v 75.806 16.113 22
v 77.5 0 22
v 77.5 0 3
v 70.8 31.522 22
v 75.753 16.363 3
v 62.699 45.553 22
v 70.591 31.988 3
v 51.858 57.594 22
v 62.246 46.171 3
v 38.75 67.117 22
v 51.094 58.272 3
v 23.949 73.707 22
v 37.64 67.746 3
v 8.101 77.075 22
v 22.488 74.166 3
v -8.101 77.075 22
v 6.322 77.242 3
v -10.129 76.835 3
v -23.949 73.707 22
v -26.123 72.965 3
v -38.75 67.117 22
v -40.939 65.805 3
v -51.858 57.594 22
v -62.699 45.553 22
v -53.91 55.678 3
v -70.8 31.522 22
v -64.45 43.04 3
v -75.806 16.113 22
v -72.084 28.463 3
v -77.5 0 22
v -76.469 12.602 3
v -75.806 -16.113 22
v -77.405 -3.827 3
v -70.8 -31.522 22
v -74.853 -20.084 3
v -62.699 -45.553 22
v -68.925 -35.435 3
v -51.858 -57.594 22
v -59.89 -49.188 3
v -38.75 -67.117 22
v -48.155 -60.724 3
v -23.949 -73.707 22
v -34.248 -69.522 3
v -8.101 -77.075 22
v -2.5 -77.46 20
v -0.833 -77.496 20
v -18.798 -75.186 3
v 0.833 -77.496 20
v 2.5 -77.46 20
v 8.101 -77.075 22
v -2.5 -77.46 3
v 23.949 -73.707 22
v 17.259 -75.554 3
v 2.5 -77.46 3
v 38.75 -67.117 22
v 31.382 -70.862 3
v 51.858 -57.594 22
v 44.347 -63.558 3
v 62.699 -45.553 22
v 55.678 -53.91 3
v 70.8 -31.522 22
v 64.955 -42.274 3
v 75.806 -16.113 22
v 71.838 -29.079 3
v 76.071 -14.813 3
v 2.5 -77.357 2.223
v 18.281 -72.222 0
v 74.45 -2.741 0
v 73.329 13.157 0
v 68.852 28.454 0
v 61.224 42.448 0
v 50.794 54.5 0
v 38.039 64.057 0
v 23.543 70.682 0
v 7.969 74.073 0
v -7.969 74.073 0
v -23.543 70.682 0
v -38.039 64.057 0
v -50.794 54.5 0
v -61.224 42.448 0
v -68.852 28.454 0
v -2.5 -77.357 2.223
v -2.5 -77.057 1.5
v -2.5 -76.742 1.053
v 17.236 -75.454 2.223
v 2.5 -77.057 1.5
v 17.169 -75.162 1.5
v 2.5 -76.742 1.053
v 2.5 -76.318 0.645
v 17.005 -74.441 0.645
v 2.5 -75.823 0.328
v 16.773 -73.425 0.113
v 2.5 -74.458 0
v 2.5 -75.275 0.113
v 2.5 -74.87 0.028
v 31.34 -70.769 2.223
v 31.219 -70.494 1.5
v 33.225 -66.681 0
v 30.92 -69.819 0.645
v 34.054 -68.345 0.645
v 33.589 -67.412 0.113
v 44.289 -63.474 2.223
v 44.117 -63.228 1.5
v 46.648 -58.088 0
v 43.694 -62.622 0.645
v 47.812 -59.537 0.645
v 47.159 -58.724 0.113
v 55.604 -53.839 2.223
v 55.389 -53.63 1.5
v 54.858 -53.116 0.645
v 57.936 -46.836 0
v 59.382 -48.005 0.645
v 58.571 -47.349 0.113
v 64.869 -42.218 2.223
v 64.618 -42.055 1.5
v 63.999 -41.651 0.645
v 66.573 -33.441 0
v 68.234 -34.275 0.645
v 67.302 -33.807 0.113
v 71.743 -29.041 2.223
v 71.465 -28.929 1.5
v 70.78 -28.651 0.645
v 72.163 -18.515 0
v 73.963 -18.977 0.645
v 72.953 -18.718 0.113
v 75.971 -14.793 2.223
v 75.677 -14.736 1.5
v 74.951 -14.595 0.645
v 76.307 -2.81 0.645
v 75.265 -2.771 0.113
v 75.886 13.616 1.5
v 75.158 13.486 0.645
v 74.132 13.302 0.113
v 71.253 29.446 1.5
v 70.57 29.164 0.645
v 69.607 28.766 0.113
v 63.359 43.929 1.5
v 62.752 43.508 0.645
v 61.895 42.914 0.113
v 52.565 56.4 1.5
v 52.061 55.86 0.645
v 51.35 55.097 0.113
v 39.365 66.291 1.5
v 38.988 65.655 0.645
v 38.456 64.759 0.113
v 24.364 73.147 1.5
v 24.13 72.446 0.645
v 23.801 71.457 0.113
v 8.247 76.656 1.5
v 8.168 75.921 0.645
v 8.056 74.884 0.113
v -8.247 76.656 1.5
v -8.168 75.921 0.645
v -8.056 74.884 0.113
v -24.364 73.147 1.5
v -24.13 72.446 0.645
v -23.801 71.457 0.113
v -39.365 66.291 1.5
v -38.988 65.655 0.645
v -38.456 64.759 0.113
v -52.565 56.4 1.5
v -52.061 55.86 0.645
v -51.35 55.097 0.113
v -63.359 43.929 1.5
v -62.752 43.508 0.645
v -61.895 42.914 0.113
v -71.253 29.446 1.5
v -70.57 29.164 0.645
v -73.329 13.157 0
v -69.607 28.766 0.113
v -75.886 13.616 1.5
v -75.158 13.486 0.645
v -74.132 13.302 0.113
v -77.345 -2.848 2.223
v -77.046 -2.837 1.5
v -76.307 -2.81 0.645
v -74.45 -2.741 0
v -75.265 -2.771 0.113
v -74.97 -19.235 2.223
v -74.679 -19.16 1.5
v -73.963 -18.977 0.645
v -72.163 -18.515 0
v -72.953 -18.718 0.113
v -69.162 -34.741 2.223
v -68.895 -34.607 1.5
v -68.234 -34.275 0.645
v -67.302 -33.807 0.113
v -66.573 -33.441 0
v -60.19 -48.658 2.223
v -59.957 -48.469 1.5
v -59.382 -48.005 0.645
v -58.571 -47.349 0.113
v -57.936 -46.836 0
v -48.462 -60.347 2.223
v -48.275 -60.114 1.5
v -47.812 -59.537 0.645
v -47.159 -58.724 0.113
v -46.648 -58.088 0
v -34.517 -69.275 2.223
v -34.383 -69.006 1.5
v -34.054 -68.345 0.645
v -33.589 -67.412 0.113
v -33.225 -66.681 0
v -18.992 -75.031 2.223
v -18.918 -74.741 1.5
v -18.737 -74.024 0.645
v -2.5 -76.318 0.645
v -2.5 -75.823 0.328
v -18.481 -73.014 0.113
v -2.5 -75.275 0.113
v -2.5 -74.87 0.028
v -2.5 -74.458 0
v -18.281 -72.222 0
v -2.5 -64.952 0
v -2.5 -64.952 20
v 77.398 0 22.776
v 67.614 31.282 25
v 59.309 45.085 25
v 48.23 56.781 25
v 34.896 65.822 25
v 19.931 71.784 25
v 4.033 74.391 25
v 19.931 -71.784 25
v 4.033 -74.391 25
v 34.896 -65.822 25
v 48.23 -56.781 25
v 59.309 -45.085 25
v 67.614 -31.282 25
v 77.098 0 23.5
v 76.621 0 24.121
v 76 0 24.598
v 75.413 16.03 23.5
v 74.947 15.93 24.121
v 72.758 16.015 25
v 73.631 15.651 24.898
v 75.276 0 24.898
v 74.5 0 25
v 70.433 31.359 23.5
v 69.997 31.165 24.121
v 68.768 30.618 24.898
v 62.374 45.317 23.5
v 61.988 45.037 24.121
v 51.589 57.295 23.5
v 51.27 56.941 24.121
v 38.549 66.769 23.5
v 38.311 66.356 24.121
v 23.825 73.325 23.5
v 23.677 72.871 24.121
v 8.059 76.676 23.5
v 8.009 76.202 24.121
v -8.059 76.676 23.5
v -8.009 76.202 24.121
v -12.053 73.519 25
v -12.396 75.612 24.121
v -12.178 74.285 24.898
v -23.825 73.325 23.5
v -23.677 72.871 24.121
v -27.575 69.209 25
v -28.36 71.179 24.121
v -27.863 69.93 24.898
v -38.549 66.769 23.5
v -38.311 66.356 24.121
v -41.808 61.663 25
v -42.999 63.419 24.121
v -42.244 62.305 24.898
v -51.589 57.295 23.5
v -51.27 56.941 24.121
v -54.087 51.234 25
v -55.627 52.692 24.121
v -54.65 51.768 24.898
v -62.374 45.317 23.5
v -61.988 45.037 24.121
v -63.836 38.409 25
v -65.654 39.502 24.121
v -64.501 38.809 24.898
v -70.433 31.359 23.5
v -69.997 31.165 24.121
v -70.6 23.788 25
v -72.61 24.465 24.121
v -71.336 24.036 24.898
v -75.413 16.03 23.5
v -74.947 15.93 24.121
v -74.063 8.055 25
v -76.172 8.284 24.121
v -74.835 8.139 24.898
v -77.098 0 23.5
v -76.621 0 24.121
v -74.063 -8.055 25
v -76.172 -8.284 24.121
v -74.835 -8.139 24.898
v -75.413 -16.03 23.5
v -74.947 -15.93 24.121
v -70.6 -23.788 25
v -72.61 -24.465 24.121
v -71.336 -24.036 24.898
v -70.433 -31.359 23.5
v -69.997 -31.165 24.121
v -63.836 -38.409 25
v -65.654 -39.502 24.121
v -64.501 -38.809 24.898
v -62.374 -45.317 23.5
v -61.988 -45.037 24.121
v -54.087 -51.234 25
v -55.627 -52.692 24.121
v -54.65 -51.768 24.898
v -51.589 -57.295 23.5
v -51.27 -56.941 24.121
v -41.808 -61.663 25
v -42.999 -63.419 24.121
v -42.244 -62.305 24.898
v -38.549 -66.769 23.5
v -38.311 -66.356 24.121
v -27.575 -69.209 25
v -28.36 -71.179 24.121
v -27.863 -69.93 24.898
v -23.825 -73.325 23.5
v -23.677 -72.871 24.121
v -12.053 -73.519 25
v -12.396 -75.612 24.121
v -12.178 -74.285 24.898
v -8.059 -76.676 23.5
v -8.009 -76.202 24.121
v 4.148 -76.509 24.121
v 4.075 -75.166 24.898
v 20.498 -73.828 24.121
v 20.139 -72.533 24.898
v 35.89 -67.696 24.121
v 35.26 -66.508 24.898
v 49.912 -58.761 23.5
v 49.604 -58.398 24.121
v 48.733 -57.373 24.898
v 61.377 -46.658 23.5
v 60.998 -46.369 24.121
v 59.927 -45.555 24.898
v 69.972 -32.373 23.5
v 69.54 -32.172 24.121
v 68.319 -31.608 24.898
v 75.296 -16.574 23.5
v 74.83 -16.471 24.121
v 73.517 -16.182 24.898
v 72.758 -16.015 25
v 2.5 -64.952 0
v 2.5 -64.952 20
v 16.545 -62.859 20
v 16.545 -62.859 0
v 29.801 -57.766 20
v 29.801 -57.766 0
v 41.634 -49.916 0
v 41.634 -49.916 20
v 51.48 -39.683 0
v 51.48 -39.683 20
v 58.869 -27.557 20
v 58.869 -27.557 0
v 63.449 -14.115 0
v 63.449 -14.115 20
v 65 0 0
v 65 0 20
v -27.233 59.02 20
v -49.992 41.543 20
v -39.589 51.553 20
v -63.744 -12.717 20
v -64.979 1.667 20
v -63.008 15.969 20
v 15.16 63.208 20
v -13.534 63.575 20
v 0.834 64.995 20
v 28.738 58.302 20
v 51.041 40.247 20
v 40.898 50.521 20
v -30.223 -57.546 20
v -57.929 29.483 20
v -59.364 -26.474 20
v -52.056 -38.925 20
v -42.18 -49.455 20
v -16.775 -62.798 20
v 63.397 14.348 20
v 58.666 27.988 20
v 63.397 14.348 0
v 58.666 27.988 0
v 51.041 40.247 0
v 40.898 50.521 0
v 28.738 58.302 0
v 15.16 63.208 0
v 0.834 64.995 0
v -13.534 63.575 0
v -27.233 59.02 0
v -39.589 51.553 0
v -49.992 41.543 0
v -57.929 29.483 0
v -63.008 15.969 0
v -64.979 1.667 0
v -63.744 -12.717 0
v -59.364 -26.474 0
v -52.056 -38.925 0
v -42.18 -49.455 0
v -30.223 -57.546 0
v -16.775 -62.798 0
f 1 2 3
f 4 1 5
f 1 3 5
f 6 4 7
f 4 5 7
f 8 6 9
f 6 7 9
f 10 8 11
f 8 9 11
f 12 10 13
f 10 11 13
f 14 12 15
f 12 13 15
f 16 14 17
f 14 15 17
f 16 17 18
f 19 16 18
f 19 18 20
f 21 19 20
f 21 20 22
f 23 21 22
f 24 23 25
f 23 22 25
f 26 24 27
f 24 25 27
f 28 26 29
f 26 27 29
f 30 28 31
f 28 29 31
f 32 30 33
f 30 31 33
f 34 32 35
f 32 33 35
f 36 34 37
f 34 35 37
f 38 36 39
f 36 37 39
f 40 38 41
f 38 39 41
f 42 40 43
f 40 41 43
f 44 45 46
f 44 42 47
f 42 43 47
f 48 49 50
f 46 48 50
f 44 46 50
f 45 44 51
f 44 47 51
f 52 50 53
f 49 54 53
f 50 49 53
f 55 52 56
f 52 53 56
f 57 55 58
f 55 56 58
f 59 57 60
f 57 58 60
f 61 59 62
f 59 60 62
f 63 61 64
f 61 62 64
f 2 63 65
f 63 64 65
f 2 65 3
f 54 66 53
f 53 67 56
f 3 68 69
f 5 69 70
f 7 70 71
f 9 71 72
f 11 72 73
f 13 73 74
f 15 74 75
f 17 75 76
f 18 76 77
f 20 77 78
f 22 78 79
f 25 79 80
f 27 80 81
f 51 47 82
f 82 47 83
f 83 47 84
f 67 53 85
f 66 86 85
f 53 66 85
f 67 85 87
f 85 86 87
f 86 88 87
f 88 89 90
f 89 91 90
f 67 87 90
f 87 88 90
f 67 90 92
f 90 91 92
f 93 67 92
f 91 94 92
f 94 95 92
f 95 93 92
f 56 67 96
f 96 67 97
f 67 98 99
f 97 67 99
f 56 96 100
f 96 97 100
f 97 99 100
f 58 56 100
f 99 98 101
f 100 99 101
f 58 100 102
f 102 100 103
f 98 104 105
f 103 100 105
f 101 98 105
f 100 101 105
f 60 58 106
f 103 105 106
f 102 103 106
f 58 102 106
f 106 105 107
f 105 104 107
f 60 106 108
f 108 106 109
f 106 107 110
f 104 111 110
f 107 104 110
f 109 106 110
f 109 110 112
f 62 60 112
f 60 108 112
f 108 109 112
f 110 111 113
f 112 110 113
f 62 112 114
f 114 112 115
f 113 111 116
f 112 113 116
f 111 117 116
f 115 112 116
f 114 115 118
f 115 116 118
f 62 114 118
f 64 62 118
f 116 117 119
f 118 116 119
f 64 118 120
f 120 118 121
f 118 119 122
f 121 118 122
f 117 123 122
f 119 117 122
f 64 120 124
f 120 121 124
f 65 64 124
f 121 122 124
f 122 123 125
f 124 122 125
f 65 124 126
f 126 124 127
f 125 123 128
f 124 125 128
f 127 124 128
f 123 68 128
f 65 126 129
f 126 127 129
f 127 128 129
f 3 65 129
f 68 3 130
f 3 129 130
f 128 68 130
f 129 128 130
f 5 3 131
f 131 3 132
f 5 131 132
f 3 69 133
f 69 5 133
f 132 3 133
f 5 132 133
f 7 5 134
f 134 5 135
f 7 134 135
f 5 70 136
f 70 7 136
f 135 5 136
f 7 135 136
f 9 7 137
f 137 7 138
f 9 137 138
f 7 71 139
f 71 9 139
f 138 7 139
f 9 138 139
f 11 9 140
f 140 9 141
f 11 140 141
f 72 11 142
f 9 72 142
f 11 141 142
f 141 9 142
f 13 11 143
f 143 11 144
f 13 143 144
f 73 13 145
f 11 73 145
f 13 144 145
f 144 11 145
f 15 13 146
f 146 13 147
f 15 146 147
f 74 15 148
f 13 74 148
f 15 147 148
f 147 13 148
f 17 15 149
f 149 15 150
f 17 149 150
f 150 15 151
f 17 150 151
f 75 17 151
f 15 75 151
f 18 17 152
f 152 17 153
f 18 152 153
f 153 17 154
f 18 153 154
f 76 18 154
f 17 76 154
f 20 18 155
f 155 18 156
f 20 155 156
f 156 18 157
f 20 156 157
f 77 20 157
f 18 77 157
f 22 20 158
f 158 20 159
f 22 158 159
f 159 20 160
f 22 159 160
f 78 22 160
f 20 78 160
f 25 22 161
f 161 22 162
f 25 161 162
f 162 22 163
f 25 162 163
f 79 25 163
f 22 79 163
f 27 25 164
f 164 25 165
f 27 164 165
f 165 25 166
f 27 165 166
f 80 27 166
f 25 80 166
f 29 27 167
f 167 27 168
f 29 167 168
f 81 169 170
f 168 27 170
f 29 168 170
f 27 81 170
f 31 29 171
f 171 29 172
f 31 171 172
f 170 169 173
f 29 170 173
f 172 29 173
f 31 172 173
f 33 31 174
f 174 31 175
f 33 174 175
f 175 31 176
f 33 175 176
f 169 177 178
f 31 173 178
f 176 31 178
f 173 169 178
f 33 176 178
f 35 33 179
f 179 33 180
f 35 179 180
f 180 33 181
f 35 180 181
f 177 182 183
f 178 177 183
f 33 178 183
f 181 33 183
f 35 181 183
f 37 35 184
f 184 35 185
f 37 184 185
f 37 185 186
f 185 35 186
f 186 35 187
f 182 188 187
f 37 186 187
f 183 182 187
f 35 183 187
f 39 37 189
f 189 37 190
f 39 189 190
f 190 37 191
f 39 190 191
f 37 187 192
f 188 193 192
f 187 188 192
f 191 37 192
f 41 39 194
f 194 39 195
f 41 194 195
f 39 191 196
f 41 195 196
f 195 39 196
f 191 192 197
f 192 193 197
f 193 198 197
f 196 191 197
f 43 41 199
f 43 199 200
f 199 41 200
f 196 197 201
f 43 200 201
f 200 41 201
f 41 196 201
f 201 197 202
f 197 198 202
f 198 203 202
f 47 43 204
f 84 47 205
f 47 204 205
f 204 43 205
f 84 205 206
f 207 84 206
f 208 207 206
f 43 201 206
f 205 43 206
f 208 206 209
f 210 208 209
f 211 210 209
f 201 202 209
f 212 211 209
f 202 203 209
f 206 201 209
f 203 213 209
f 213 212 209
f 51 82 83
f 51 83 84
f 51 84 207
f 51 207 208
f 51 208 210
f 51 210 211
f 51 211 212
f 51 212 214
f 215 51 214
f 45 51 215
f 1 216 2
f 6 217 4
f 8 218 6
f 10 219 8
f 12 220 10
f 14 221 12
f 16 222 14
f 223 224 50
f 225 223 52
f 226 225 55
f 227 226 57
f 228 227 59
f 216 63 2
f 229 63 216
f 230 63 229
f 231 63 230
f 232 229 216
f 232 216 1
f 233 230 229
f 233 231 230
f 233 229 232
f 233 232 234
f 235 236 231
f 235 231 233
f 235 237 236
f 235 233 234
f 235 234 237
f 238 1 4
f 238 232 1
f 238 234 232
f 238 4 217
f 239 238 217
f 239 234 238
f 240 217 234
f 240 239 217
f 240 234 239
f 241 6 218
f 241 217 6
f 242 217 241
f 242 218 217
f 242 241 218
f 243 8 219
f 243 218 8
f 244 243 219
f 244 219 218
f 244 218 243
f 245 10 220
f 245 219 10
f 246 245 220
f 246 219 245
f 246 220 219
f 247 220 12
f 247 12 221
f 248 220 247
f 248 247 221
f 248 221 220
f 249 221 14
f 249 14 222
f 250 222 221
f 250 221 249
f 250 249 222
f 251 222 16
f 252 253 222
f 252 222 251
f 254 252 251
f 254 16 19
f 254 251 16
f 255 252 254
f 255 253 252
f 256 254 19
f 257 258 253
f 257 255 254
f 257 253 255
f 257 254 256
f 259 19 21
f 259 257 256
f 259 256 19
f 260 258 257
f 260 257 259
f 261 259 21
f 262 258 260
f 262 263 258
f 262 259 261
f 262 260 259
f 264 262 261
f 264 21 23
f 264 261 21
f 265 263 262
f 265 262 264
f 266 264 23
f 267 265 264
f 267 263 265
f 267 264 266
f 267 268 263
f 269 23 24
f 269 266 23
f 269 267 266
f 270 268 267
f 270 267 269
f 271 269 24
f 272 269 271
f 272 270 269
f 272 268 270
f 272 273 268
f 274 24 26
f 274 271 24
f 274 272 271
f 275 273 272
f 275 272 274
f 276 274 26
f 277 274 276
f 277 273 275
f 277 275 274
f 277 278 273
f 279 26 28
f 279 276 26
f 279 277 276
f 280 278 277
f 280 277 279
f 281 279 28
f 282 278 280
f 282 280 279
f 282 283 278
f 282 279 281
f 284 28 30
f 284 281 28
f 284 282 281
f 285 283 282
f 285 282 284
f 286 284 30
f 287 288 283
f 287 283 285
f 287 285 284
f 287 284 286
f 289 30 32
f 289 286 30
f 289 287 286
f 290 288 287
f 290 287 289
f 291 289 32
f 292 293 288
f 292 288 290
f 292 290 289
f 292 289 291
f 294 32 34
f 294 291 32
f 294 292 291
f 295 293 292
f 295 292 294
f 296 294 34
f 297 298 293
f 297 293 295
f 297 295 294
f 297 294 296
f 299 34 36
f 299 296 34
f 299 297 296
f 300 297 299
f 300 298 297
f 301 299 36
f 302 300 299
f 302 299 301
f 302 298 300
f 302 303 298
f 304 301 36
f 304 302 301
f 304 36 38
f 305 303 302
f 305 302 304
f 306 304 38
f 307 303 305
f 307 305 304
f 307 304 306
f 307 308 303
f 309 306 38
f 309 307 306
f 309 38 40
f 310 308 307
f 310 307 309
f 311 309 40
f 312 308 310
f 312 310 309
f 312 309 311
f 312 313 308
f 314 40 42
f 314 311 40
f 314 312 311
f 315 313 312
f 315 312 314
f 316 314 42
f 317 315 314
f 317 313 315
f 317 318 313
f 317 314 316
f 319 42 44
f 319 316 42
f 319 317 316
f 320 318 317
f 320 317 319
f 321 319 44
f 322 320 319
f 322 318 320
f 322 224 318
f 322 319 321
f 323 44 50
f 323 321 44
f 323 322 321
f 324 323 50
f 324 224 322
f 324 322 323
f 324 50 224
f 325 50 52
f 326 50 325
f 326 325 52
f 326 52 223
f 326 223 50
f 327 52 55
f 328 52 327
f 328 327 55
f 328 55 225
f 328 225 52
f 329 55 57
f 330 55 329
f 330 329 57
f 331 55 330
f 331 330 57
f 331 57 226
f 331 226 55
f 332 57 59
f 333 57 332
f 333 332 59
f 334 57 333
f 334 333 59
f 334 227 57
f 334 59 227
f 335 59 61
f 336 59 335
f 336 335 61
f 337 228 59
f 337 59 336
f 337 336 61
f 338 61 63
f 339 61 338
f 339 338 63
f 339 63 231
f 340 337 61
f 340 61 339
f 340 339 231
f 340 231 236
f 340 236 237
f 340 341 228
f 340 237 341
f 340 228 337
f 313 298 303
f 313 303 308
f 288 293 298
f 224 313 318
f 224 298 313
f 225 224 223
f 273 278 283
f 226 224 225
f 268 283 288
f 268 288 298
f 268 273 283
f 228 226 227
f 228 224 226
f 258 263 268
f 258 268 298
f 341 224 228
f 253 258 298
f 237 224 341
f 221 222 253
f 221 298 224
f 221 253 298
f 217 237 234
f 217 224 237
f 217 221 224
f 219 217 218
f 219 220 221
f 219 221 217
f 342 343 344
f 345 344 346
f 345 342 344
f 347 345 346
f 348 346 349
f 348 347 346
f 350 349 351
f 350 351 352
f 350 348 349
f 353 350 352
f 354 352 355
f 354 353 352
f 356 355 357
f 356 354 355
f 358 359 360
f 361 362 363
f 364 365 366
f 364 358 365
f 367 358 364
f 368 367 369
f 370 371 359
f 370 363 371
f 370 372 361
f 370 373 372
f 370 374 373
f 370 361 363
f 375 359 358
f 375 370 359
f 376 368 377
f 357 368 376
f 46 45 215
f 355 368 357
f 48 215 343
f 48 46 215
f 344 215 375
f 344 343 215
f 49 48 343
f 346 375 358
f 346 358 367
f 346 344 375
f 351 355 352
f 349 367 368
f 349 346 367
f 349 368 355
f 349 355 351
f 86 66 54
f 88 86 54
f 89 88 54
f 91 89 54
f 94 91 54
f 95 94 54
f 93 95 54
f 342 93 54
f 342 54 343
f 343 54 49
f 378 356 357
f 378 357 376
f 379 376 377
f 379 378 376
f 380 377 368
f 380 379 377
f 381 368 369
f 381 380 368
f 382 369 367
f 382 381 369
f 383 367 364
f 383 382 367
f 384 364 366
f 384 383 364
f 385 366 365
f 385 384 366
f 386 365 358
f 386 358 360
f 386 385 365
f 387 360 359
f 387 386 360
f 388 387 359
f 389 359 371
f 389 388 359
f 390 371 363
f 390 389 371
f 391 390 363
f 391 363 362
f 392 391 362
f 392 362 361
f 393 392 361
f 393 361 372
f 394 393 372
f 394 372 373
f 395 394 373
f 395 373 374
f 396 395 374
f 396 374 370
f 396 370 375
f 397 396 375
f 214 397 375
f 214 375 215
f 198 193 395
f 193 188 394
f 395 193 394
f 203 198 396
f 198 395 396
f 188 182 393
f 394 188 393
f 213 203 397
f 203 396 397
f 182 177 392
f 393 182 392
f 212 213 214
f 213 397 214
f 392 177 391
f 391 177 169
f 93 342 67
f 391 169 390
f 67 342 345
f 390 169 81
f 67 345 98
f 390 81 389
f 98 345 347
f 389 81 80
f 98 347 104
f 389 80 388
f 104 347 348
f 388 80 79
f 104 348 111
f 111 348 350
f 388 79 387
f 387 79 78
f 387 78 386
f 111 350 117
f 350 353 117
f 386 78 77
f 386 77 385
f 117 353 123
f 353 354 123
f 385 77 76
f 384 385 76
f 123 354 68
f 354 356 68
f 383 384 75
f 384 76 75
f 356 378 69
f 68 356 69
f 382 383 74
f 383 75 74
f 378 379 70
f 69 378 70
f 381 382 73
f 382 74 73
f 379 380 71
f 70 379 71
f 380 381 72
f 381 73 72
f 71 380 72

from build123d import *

# Parameters (mm, degrees)
SKETCH_R        = 77.5
PAD_DEPTH       = 25
FILLET_R        = 3
SKETCH001_R     = 65
POCKET_DEPTH    = 20
SKETCH002_W     = 5
SKETCH002_H     = 20
POCKET001_DEPTH = 15
FILLET001_R     = 3


with BuildPart() as part:
    # Sketch → Pad (new body)
    with BuildSketch(Plane.XY):
        Circle(SKETCH_R)
    extrude(amount=PAD_DEPTH)

    # Fillet
    fillet_edges = [part.edges().sort_by_distance(p)[0] for p in [
        (-77.5, 0, 25),
    ]]
    fillet(fillet_edges, radius=FILLET_R)

    # Sketch001 → Pocket (cut)
    with BuildSketch(Plane.XY):
        Circle(SKETCH001_R)
    extrude(amount=POCKET_DEPTH, mode=Mode.SUBTRACT)

    # Sketch002 → Pocket001 (cut)
    with BuildSketch(Plane.XZ.offset(78)):
        with Locations((0, 10)):
            Rectangle(SKETCH002_W, SKETCH002_H)
    extrude(amount=-POCKET001_DEPTH, mode=Mode.SUBTRACT)

    # Fillet001
    fillet001_edges = [part.edges().sort_by_distance(p)[0] for p in [
        (55.677644, -53.909647, 0),
        (-53.909647, 55.677644, 0),
    ]]
    fillet(fillet001_edges, radius=FILLET001_R)


solid = part.part
